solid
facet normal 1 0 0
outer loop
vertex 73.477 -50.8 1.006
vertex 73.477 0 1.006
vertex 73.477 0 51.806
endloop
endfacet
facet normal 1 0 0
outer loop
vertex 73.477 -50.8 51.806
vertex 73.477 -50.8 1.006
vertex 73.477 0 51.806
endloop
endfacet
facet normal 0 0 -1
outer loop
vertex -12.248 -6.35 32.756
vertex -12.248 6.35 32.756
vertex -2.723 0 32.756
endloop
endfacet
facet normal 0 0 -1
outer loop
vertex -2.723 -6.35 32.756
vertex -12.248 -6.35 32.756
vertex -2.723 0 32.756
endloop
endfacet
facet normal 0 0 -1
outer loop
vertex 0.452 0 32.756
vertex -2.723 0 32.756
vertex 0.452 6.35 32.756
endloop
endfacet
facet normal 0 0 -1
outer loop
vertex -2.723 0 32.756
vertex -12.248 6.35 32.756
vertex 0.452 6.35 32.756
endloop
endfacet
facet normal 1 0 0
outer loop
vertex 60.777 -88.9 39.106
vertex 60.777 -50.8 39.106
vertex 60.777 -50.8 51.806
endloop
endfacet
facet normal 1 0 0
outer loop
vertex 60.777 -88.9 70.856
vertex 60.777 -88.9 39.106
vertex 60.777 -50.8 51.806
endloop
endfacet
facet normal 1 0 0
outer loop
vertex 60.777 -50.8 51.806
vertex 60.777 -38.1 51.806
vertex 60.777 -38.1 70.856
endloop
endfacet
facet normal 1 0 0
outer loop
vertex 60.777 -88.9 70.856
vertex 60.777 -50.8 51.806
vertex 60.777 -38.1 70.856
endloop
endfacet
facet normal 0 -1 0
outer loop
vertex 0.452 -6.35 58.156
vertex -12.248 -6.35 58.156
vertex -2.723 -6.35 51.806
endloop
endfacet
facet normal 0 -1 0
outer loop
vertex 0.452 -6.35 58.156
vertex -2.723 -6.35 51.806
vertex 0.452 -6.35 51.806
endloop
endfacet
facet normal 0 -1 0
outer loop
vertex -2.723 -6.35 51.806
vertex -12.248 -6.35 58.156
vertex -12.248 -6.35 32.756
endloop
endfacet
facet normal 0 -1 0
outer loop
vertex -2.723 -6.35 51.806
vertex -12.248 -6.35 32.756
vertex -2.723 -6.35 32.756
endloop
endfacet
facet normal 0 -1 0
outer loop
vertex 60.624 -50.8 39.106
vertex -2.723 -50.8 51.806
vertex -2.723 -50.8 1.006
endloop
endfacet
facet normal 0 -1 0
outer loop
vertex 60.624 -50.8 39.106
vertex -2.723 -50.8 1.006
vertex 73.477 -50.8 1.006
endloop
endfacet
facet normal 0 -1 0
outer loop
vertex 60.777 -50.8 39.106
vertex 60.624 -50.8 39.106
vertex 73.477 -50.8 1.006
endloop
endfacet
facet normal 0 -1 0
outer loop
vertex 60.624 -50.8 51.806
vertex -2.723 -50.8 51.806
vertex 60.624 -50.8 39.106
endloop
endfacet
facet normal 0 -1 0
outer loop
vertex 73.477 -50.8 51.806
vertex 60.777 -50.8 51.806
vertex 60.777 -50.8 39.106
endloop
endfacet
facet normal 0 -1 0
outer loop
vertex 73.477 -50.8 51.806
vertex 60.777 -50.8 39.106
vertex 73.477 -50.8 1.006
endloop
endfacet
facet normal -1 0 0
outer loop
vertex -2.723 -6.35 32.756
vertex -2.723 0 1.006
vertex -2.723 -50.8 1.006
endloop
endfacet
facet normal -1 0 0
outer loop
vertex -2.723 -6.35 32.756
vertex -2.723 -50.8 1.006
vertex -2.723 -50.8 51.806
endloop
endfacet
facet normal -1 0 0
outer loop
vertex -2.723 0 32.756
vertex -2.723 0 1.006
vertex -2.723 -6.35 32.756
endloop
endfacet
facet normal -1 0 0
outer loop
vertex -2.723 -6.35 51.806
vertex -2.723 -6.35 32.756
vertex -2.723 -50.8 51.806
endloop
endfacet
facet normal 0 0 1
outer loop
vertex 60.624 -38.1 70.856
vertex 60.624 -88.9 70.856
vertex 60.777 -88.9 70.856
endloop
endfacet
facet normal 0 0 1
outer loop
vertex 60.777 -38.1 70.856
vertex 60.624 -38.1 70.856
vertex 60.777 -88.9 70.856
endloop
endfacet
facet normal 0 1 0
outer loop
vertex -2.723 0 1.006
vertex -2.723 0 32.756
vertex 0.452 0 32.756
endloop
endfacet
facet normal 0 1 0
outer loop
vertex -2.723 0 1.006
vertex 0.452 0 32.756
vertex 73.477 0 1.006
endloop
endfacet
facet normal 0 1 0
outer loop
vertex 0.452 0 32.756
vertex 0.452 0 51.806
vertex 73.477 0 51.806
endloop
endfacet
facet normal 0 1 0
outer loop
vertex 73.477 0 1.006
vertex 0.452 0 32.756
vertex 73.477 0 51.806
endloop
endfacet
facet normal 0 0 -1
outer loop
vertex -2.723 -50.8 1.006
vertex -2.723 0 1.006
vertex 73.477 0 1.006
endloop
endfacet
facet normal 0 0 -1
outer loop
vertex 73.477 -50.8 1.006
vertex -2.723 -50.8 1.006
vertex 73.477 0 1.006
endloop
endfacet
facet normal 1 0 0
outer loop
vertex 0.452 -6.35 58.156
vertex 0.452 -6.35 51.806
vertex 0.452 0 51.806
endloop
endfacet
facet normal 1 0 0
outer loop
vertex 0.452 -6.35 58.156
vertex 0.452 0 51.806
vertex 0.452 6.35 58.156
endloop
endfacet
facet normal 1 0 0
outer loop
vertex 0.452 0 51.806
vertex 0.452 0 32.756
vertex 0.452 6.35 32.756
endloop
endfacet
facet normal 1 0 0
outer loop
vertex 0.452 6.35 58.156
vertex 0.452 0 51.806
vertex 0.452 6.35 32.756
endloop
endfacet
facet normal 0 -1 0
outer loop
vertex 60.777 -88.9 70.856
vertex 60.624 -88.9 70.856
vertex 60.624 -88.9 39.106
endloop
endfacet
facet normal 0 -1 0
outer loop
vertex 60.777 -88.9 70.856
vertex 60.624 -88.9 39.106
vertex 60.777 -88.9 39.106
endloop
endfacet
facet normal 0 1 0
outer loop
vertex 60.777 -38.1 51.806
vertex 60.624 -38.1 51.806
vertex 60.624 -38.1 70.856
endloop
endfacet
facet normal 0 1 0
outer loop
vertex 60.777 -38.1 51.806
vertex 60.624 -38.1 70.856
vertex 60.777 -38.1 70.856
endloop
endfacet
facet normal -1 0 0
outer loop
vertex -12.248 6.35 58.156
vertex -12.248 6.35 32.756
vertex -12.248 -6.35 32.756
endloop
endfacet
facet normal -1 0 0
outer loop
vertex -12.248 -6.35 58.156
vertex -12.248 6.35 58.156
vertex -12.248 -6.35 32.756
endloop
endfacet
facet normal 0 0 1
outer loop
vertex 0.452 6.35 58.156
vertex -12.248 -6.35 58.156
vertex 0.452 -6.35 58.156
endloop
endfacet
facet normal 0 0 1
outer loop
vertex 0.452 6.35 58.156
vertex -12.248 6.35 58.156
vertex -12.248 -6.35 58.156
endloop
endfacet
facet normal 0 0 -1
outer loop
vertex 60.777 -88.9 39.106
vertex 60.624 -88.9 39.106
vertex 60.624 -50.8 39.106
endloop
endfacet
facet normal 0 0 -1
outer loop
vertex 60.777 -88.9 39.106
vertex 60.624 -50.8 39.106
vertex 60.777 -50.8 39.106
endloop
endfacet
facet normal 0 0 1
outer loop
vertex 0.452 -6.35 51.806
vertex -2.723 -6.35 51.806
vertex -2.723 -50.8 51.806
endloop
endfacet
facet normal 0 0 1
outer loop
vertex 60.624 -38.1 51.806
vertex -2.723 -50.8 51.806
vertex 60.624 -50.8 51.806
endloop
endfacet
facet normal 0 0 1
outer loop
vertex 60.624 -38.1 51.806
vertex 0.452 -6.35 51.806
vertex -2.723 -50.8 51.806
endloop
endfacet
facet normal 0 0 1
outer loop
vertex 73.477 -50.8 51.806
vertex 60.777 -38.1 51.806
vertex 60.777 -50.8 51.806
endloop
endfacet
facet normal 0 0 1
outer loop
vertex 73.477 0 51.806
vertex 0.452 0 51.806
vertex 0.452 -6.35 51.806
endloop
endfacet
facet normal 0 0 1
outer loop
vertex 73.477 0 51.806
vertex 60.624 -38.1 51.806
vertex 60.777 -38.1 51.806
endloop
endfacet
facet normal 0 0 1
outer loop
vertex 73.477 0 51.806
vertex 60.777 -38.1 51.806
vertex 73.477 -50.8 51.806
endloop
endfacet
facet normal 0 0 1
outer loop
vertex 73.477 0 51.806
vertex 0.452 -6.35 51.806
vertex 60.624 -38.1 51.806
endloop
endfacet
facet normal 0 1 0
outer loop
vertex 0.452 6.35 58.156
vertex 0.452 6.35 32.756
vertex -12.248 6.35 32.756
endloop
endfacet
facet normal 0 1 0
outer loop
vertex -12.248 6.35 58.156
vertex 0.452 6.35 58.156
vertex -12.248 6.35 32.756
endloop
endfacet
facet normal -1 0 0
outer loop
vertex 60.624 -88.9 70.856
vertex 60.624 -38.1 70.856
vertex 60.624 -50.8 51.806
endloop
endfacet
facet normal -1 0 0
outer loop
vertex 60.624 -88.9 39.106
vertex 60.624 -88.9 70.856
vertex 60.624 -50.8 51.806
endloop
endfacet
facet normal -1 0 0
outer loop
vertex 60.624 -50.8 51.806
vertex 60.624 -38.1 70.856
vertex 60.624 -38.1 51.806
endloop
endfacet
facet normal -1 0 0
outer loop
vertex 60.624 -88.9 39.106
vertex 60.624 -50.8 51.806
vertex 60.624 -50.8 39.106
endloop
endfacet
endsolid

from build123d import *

# Parameters (mm, degrees)
F0_W     = 76.2
F0_H     = 50.8
F1_DEPTH = 50.8
F2_W     = 0.1524
F2_H     = 12.7
F3_DEPTH = 12.7
F4_W     = 0.1524
F4_H     = 19.05
F4_H_2   = 12.7
F5_DEPTH = 50.8
F6_W     = 6.35
F6_H     = 19.05
F7_DEPTH = 3.175
F8_W     = 3.175
F8_H     = 6.35
F9_DEPTH = 25.4


with BuildPart() as f1:
    # F0 (on Front) → F1 (new body)
    with BuildSketch(Plane.XZ):
        with Locations((35.376799, 26.406373)):
            Rectangle(F0_W, F0_H)
    extrude(amount=F1_DEPTH)

    # F2 (on face) → F3 (cut)
    with BuildSketch(Plane.XZ.offset(50.8)):
        with Locations((60.700599, 45.456373)):
            Rectangle(F2_W, F2_H)
    extrude(amount=-F3_DEPTH, mode=Mode.SUBTRACT)

    # F4 (on face) → F5 (join)
    with BuildSketch(Plane.XZ.offset(38.1)):
        with Locations((60.700599, 61.331373)):
            Rectangle(F4_W, F4_H)
        with Locations((60.700599, 45.456373)):
            Rectangle(F4_W, F4_H_2)
    extrude(amount=F5_DEPTH)

    # F6 (on face) → F7 (cut)
    with BuildSketch(Plane(origin=(-2.723201, 0, 0), x_dir=(0, -1, 0), z_dir=(-1, 0, 0))):
        with Locations((3.175, 42.281373)):
            Rectangle(F6_W, F6_H)
    extrude(amount=-F7_DEPTH, mode=Mode.SUBTRACT)

    # F8 (on face) → F9 (join)
    with BuildSketch(Plane.XY.offset(32.756373)):
        Polygon((-12.248201, -6.35), (-2.723201, -6.35), (-2.723201, 0), (0.451799, 0), (0.451799, 6.35), (-12.248201, 6.35), align=None)
        with Locations((-1.135701, -3.175)):
            Rectangle(F8_W, F8_H)
    extrude(amount=F9_DEPTH)


solid = f1.part
